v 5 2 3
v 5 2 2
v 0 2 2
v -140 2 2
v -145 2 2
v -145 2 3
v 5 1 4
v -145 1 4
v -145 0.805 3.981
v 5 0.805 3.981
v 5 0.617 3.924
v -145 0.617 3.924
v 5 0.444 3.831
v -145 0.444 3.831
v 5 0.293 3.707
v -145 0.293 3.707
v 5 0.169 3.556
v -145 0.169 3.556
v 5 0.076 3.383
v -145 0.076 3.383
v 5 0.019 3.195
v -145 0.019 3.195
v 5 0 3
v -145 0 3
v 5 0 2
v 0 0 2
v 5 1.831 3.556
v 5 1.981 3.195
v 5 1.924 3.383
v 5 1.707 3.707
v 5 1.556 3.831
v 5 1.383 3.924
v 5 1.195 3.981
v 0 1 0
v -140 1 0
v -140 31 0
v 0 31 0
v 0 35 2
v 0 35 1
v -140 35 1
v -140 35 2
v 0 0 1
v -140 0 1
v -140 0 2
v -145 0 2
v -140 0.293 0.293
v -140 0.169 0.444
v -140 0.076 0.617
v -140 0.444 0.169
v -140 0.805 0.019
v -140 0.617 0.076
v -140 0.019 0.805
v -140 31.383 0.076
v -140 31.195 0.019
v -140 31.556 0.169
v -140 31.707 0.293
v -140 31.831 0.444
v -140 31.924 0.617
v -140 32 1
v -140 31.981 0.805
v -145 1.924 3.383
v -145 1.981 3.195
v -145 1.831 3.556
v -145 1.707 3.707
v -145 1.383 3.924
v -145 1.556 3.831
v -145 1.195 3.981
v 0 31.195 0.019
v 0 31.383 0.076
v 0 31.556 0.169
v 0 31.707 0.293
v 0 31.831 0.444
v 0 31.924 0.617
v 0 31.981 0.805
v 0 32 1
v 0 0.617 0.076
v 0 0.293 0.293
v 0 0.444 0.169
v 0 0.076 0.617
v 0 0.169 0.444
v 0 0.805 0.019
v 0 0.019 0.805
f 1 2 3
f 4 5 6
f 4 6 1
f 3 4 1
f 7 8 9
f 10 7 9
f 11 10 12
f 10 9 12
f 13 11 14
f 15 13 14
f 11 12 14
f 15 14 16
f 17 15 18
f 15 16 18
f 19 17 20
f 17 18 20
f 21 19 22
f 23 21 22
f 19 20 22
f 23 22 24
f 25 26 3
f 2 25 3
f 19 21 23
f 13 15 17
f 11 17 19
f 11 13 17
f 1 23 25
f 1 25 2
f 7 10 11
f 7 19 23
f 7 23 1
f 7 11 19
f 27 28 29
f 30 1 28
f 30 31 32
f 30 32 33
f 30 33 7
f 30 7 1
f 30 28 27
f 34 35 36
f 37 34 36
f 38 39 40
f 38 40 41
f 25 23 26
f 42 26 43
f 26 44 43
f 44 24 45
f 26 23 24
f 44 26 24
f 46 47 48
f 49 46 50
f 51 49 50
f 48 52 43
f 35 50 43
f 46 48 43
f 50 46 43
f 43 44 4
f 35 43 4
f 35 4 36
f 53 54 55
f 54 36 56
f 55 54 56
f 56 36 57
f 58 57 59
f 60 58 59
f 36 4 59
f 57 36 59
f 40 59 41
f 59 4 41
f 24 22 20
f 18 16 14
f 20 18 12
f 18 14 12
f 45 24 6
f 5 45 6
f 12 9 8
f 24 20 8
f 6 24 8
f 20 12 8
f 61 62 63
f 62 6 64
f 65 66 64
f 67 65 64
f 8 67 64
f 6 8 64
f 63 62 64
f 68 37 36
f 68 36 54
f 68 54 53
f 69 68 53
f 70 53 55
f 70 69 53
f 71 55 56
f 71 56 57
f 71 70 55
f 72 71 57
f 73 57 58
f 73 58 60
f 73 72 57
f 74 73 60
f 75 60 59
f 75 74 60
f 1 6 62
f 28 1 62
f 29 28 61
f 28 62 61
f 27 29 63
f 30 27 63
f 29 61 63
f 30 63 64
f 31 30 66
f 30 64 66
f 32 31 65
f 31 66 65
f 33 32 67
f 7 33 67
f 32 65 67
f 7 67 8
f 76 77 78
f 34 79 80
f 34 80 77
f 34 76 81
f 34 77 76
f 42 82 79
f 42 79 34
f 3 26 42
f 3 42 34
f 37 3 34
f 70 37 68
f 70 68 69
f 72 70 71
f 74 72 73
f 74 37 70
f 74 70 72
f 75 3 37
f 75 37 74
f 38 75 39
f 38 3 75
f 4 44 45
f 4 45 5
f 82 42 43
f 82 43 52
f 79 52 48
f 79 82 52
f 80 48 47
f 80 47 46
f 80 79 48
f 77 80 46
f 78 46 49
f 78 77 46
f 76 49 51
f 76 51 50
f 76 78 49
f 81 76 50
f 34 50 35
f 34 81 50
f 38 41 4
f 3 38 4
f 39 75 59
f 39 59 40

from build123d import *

# Parameters (mm, degrees)
F2_DEPTH = 140
F3_DEPTH = 145
F4_DEPTH = 5


with BuildPart() as f2:
    # F0 (on Right) → F2 (new body)
    with BuildSketch(Plane.YZ):
        with BuildLine():
            ThreePointArc((0, 1), (0.292893, 0.292893), (1, 0))
            Line((1, 0), (31, 0))
            ThreePointArc((31, 0), (31.707107, 0.292893), (32, 1))
            Line((32, 1), (35, 1))
            Line((35, 1), (35, 2))
            Line((35, 2), (0, 2))
            Line((0, 2), (0, 1))
        make_face()
    extrude(amount=-F2_DEPTH)

    # F1 (on Right) → F3 (join)
    with BuildSketch(Plane.YZ):
        with BuildLine():
            Line((0, 3), (0, 2))
            Line((0, 2), (2, 2))
            Line((2, 2), (2, 3))
            ThreePointArc((2, 3), (1.707107, 3.707107), (1, 4))
            ThreePointArc((1, 4), (0.292893, 3.707107), (0, 3))
        make_face()
    extrude(amount=-F3_DEPTH)

    # F1 (on Right) → F4 (join)
    with BuildSketch(Plane.YZ):
        with BuildLine():
            Line((0, 3), (0, 2))
            Line((0, 2), (2, 2))
            Line((2, 2), (2, 3))
            ThreePointArc((2, 3), (1.707107, 3.707107), (1, 4))
            ThreePointArc((1, 4), (0.292893, 3.707107), (0, 3))
        make_face()
    extrude(amount=F4_DEPTH)


solid = f2.part
